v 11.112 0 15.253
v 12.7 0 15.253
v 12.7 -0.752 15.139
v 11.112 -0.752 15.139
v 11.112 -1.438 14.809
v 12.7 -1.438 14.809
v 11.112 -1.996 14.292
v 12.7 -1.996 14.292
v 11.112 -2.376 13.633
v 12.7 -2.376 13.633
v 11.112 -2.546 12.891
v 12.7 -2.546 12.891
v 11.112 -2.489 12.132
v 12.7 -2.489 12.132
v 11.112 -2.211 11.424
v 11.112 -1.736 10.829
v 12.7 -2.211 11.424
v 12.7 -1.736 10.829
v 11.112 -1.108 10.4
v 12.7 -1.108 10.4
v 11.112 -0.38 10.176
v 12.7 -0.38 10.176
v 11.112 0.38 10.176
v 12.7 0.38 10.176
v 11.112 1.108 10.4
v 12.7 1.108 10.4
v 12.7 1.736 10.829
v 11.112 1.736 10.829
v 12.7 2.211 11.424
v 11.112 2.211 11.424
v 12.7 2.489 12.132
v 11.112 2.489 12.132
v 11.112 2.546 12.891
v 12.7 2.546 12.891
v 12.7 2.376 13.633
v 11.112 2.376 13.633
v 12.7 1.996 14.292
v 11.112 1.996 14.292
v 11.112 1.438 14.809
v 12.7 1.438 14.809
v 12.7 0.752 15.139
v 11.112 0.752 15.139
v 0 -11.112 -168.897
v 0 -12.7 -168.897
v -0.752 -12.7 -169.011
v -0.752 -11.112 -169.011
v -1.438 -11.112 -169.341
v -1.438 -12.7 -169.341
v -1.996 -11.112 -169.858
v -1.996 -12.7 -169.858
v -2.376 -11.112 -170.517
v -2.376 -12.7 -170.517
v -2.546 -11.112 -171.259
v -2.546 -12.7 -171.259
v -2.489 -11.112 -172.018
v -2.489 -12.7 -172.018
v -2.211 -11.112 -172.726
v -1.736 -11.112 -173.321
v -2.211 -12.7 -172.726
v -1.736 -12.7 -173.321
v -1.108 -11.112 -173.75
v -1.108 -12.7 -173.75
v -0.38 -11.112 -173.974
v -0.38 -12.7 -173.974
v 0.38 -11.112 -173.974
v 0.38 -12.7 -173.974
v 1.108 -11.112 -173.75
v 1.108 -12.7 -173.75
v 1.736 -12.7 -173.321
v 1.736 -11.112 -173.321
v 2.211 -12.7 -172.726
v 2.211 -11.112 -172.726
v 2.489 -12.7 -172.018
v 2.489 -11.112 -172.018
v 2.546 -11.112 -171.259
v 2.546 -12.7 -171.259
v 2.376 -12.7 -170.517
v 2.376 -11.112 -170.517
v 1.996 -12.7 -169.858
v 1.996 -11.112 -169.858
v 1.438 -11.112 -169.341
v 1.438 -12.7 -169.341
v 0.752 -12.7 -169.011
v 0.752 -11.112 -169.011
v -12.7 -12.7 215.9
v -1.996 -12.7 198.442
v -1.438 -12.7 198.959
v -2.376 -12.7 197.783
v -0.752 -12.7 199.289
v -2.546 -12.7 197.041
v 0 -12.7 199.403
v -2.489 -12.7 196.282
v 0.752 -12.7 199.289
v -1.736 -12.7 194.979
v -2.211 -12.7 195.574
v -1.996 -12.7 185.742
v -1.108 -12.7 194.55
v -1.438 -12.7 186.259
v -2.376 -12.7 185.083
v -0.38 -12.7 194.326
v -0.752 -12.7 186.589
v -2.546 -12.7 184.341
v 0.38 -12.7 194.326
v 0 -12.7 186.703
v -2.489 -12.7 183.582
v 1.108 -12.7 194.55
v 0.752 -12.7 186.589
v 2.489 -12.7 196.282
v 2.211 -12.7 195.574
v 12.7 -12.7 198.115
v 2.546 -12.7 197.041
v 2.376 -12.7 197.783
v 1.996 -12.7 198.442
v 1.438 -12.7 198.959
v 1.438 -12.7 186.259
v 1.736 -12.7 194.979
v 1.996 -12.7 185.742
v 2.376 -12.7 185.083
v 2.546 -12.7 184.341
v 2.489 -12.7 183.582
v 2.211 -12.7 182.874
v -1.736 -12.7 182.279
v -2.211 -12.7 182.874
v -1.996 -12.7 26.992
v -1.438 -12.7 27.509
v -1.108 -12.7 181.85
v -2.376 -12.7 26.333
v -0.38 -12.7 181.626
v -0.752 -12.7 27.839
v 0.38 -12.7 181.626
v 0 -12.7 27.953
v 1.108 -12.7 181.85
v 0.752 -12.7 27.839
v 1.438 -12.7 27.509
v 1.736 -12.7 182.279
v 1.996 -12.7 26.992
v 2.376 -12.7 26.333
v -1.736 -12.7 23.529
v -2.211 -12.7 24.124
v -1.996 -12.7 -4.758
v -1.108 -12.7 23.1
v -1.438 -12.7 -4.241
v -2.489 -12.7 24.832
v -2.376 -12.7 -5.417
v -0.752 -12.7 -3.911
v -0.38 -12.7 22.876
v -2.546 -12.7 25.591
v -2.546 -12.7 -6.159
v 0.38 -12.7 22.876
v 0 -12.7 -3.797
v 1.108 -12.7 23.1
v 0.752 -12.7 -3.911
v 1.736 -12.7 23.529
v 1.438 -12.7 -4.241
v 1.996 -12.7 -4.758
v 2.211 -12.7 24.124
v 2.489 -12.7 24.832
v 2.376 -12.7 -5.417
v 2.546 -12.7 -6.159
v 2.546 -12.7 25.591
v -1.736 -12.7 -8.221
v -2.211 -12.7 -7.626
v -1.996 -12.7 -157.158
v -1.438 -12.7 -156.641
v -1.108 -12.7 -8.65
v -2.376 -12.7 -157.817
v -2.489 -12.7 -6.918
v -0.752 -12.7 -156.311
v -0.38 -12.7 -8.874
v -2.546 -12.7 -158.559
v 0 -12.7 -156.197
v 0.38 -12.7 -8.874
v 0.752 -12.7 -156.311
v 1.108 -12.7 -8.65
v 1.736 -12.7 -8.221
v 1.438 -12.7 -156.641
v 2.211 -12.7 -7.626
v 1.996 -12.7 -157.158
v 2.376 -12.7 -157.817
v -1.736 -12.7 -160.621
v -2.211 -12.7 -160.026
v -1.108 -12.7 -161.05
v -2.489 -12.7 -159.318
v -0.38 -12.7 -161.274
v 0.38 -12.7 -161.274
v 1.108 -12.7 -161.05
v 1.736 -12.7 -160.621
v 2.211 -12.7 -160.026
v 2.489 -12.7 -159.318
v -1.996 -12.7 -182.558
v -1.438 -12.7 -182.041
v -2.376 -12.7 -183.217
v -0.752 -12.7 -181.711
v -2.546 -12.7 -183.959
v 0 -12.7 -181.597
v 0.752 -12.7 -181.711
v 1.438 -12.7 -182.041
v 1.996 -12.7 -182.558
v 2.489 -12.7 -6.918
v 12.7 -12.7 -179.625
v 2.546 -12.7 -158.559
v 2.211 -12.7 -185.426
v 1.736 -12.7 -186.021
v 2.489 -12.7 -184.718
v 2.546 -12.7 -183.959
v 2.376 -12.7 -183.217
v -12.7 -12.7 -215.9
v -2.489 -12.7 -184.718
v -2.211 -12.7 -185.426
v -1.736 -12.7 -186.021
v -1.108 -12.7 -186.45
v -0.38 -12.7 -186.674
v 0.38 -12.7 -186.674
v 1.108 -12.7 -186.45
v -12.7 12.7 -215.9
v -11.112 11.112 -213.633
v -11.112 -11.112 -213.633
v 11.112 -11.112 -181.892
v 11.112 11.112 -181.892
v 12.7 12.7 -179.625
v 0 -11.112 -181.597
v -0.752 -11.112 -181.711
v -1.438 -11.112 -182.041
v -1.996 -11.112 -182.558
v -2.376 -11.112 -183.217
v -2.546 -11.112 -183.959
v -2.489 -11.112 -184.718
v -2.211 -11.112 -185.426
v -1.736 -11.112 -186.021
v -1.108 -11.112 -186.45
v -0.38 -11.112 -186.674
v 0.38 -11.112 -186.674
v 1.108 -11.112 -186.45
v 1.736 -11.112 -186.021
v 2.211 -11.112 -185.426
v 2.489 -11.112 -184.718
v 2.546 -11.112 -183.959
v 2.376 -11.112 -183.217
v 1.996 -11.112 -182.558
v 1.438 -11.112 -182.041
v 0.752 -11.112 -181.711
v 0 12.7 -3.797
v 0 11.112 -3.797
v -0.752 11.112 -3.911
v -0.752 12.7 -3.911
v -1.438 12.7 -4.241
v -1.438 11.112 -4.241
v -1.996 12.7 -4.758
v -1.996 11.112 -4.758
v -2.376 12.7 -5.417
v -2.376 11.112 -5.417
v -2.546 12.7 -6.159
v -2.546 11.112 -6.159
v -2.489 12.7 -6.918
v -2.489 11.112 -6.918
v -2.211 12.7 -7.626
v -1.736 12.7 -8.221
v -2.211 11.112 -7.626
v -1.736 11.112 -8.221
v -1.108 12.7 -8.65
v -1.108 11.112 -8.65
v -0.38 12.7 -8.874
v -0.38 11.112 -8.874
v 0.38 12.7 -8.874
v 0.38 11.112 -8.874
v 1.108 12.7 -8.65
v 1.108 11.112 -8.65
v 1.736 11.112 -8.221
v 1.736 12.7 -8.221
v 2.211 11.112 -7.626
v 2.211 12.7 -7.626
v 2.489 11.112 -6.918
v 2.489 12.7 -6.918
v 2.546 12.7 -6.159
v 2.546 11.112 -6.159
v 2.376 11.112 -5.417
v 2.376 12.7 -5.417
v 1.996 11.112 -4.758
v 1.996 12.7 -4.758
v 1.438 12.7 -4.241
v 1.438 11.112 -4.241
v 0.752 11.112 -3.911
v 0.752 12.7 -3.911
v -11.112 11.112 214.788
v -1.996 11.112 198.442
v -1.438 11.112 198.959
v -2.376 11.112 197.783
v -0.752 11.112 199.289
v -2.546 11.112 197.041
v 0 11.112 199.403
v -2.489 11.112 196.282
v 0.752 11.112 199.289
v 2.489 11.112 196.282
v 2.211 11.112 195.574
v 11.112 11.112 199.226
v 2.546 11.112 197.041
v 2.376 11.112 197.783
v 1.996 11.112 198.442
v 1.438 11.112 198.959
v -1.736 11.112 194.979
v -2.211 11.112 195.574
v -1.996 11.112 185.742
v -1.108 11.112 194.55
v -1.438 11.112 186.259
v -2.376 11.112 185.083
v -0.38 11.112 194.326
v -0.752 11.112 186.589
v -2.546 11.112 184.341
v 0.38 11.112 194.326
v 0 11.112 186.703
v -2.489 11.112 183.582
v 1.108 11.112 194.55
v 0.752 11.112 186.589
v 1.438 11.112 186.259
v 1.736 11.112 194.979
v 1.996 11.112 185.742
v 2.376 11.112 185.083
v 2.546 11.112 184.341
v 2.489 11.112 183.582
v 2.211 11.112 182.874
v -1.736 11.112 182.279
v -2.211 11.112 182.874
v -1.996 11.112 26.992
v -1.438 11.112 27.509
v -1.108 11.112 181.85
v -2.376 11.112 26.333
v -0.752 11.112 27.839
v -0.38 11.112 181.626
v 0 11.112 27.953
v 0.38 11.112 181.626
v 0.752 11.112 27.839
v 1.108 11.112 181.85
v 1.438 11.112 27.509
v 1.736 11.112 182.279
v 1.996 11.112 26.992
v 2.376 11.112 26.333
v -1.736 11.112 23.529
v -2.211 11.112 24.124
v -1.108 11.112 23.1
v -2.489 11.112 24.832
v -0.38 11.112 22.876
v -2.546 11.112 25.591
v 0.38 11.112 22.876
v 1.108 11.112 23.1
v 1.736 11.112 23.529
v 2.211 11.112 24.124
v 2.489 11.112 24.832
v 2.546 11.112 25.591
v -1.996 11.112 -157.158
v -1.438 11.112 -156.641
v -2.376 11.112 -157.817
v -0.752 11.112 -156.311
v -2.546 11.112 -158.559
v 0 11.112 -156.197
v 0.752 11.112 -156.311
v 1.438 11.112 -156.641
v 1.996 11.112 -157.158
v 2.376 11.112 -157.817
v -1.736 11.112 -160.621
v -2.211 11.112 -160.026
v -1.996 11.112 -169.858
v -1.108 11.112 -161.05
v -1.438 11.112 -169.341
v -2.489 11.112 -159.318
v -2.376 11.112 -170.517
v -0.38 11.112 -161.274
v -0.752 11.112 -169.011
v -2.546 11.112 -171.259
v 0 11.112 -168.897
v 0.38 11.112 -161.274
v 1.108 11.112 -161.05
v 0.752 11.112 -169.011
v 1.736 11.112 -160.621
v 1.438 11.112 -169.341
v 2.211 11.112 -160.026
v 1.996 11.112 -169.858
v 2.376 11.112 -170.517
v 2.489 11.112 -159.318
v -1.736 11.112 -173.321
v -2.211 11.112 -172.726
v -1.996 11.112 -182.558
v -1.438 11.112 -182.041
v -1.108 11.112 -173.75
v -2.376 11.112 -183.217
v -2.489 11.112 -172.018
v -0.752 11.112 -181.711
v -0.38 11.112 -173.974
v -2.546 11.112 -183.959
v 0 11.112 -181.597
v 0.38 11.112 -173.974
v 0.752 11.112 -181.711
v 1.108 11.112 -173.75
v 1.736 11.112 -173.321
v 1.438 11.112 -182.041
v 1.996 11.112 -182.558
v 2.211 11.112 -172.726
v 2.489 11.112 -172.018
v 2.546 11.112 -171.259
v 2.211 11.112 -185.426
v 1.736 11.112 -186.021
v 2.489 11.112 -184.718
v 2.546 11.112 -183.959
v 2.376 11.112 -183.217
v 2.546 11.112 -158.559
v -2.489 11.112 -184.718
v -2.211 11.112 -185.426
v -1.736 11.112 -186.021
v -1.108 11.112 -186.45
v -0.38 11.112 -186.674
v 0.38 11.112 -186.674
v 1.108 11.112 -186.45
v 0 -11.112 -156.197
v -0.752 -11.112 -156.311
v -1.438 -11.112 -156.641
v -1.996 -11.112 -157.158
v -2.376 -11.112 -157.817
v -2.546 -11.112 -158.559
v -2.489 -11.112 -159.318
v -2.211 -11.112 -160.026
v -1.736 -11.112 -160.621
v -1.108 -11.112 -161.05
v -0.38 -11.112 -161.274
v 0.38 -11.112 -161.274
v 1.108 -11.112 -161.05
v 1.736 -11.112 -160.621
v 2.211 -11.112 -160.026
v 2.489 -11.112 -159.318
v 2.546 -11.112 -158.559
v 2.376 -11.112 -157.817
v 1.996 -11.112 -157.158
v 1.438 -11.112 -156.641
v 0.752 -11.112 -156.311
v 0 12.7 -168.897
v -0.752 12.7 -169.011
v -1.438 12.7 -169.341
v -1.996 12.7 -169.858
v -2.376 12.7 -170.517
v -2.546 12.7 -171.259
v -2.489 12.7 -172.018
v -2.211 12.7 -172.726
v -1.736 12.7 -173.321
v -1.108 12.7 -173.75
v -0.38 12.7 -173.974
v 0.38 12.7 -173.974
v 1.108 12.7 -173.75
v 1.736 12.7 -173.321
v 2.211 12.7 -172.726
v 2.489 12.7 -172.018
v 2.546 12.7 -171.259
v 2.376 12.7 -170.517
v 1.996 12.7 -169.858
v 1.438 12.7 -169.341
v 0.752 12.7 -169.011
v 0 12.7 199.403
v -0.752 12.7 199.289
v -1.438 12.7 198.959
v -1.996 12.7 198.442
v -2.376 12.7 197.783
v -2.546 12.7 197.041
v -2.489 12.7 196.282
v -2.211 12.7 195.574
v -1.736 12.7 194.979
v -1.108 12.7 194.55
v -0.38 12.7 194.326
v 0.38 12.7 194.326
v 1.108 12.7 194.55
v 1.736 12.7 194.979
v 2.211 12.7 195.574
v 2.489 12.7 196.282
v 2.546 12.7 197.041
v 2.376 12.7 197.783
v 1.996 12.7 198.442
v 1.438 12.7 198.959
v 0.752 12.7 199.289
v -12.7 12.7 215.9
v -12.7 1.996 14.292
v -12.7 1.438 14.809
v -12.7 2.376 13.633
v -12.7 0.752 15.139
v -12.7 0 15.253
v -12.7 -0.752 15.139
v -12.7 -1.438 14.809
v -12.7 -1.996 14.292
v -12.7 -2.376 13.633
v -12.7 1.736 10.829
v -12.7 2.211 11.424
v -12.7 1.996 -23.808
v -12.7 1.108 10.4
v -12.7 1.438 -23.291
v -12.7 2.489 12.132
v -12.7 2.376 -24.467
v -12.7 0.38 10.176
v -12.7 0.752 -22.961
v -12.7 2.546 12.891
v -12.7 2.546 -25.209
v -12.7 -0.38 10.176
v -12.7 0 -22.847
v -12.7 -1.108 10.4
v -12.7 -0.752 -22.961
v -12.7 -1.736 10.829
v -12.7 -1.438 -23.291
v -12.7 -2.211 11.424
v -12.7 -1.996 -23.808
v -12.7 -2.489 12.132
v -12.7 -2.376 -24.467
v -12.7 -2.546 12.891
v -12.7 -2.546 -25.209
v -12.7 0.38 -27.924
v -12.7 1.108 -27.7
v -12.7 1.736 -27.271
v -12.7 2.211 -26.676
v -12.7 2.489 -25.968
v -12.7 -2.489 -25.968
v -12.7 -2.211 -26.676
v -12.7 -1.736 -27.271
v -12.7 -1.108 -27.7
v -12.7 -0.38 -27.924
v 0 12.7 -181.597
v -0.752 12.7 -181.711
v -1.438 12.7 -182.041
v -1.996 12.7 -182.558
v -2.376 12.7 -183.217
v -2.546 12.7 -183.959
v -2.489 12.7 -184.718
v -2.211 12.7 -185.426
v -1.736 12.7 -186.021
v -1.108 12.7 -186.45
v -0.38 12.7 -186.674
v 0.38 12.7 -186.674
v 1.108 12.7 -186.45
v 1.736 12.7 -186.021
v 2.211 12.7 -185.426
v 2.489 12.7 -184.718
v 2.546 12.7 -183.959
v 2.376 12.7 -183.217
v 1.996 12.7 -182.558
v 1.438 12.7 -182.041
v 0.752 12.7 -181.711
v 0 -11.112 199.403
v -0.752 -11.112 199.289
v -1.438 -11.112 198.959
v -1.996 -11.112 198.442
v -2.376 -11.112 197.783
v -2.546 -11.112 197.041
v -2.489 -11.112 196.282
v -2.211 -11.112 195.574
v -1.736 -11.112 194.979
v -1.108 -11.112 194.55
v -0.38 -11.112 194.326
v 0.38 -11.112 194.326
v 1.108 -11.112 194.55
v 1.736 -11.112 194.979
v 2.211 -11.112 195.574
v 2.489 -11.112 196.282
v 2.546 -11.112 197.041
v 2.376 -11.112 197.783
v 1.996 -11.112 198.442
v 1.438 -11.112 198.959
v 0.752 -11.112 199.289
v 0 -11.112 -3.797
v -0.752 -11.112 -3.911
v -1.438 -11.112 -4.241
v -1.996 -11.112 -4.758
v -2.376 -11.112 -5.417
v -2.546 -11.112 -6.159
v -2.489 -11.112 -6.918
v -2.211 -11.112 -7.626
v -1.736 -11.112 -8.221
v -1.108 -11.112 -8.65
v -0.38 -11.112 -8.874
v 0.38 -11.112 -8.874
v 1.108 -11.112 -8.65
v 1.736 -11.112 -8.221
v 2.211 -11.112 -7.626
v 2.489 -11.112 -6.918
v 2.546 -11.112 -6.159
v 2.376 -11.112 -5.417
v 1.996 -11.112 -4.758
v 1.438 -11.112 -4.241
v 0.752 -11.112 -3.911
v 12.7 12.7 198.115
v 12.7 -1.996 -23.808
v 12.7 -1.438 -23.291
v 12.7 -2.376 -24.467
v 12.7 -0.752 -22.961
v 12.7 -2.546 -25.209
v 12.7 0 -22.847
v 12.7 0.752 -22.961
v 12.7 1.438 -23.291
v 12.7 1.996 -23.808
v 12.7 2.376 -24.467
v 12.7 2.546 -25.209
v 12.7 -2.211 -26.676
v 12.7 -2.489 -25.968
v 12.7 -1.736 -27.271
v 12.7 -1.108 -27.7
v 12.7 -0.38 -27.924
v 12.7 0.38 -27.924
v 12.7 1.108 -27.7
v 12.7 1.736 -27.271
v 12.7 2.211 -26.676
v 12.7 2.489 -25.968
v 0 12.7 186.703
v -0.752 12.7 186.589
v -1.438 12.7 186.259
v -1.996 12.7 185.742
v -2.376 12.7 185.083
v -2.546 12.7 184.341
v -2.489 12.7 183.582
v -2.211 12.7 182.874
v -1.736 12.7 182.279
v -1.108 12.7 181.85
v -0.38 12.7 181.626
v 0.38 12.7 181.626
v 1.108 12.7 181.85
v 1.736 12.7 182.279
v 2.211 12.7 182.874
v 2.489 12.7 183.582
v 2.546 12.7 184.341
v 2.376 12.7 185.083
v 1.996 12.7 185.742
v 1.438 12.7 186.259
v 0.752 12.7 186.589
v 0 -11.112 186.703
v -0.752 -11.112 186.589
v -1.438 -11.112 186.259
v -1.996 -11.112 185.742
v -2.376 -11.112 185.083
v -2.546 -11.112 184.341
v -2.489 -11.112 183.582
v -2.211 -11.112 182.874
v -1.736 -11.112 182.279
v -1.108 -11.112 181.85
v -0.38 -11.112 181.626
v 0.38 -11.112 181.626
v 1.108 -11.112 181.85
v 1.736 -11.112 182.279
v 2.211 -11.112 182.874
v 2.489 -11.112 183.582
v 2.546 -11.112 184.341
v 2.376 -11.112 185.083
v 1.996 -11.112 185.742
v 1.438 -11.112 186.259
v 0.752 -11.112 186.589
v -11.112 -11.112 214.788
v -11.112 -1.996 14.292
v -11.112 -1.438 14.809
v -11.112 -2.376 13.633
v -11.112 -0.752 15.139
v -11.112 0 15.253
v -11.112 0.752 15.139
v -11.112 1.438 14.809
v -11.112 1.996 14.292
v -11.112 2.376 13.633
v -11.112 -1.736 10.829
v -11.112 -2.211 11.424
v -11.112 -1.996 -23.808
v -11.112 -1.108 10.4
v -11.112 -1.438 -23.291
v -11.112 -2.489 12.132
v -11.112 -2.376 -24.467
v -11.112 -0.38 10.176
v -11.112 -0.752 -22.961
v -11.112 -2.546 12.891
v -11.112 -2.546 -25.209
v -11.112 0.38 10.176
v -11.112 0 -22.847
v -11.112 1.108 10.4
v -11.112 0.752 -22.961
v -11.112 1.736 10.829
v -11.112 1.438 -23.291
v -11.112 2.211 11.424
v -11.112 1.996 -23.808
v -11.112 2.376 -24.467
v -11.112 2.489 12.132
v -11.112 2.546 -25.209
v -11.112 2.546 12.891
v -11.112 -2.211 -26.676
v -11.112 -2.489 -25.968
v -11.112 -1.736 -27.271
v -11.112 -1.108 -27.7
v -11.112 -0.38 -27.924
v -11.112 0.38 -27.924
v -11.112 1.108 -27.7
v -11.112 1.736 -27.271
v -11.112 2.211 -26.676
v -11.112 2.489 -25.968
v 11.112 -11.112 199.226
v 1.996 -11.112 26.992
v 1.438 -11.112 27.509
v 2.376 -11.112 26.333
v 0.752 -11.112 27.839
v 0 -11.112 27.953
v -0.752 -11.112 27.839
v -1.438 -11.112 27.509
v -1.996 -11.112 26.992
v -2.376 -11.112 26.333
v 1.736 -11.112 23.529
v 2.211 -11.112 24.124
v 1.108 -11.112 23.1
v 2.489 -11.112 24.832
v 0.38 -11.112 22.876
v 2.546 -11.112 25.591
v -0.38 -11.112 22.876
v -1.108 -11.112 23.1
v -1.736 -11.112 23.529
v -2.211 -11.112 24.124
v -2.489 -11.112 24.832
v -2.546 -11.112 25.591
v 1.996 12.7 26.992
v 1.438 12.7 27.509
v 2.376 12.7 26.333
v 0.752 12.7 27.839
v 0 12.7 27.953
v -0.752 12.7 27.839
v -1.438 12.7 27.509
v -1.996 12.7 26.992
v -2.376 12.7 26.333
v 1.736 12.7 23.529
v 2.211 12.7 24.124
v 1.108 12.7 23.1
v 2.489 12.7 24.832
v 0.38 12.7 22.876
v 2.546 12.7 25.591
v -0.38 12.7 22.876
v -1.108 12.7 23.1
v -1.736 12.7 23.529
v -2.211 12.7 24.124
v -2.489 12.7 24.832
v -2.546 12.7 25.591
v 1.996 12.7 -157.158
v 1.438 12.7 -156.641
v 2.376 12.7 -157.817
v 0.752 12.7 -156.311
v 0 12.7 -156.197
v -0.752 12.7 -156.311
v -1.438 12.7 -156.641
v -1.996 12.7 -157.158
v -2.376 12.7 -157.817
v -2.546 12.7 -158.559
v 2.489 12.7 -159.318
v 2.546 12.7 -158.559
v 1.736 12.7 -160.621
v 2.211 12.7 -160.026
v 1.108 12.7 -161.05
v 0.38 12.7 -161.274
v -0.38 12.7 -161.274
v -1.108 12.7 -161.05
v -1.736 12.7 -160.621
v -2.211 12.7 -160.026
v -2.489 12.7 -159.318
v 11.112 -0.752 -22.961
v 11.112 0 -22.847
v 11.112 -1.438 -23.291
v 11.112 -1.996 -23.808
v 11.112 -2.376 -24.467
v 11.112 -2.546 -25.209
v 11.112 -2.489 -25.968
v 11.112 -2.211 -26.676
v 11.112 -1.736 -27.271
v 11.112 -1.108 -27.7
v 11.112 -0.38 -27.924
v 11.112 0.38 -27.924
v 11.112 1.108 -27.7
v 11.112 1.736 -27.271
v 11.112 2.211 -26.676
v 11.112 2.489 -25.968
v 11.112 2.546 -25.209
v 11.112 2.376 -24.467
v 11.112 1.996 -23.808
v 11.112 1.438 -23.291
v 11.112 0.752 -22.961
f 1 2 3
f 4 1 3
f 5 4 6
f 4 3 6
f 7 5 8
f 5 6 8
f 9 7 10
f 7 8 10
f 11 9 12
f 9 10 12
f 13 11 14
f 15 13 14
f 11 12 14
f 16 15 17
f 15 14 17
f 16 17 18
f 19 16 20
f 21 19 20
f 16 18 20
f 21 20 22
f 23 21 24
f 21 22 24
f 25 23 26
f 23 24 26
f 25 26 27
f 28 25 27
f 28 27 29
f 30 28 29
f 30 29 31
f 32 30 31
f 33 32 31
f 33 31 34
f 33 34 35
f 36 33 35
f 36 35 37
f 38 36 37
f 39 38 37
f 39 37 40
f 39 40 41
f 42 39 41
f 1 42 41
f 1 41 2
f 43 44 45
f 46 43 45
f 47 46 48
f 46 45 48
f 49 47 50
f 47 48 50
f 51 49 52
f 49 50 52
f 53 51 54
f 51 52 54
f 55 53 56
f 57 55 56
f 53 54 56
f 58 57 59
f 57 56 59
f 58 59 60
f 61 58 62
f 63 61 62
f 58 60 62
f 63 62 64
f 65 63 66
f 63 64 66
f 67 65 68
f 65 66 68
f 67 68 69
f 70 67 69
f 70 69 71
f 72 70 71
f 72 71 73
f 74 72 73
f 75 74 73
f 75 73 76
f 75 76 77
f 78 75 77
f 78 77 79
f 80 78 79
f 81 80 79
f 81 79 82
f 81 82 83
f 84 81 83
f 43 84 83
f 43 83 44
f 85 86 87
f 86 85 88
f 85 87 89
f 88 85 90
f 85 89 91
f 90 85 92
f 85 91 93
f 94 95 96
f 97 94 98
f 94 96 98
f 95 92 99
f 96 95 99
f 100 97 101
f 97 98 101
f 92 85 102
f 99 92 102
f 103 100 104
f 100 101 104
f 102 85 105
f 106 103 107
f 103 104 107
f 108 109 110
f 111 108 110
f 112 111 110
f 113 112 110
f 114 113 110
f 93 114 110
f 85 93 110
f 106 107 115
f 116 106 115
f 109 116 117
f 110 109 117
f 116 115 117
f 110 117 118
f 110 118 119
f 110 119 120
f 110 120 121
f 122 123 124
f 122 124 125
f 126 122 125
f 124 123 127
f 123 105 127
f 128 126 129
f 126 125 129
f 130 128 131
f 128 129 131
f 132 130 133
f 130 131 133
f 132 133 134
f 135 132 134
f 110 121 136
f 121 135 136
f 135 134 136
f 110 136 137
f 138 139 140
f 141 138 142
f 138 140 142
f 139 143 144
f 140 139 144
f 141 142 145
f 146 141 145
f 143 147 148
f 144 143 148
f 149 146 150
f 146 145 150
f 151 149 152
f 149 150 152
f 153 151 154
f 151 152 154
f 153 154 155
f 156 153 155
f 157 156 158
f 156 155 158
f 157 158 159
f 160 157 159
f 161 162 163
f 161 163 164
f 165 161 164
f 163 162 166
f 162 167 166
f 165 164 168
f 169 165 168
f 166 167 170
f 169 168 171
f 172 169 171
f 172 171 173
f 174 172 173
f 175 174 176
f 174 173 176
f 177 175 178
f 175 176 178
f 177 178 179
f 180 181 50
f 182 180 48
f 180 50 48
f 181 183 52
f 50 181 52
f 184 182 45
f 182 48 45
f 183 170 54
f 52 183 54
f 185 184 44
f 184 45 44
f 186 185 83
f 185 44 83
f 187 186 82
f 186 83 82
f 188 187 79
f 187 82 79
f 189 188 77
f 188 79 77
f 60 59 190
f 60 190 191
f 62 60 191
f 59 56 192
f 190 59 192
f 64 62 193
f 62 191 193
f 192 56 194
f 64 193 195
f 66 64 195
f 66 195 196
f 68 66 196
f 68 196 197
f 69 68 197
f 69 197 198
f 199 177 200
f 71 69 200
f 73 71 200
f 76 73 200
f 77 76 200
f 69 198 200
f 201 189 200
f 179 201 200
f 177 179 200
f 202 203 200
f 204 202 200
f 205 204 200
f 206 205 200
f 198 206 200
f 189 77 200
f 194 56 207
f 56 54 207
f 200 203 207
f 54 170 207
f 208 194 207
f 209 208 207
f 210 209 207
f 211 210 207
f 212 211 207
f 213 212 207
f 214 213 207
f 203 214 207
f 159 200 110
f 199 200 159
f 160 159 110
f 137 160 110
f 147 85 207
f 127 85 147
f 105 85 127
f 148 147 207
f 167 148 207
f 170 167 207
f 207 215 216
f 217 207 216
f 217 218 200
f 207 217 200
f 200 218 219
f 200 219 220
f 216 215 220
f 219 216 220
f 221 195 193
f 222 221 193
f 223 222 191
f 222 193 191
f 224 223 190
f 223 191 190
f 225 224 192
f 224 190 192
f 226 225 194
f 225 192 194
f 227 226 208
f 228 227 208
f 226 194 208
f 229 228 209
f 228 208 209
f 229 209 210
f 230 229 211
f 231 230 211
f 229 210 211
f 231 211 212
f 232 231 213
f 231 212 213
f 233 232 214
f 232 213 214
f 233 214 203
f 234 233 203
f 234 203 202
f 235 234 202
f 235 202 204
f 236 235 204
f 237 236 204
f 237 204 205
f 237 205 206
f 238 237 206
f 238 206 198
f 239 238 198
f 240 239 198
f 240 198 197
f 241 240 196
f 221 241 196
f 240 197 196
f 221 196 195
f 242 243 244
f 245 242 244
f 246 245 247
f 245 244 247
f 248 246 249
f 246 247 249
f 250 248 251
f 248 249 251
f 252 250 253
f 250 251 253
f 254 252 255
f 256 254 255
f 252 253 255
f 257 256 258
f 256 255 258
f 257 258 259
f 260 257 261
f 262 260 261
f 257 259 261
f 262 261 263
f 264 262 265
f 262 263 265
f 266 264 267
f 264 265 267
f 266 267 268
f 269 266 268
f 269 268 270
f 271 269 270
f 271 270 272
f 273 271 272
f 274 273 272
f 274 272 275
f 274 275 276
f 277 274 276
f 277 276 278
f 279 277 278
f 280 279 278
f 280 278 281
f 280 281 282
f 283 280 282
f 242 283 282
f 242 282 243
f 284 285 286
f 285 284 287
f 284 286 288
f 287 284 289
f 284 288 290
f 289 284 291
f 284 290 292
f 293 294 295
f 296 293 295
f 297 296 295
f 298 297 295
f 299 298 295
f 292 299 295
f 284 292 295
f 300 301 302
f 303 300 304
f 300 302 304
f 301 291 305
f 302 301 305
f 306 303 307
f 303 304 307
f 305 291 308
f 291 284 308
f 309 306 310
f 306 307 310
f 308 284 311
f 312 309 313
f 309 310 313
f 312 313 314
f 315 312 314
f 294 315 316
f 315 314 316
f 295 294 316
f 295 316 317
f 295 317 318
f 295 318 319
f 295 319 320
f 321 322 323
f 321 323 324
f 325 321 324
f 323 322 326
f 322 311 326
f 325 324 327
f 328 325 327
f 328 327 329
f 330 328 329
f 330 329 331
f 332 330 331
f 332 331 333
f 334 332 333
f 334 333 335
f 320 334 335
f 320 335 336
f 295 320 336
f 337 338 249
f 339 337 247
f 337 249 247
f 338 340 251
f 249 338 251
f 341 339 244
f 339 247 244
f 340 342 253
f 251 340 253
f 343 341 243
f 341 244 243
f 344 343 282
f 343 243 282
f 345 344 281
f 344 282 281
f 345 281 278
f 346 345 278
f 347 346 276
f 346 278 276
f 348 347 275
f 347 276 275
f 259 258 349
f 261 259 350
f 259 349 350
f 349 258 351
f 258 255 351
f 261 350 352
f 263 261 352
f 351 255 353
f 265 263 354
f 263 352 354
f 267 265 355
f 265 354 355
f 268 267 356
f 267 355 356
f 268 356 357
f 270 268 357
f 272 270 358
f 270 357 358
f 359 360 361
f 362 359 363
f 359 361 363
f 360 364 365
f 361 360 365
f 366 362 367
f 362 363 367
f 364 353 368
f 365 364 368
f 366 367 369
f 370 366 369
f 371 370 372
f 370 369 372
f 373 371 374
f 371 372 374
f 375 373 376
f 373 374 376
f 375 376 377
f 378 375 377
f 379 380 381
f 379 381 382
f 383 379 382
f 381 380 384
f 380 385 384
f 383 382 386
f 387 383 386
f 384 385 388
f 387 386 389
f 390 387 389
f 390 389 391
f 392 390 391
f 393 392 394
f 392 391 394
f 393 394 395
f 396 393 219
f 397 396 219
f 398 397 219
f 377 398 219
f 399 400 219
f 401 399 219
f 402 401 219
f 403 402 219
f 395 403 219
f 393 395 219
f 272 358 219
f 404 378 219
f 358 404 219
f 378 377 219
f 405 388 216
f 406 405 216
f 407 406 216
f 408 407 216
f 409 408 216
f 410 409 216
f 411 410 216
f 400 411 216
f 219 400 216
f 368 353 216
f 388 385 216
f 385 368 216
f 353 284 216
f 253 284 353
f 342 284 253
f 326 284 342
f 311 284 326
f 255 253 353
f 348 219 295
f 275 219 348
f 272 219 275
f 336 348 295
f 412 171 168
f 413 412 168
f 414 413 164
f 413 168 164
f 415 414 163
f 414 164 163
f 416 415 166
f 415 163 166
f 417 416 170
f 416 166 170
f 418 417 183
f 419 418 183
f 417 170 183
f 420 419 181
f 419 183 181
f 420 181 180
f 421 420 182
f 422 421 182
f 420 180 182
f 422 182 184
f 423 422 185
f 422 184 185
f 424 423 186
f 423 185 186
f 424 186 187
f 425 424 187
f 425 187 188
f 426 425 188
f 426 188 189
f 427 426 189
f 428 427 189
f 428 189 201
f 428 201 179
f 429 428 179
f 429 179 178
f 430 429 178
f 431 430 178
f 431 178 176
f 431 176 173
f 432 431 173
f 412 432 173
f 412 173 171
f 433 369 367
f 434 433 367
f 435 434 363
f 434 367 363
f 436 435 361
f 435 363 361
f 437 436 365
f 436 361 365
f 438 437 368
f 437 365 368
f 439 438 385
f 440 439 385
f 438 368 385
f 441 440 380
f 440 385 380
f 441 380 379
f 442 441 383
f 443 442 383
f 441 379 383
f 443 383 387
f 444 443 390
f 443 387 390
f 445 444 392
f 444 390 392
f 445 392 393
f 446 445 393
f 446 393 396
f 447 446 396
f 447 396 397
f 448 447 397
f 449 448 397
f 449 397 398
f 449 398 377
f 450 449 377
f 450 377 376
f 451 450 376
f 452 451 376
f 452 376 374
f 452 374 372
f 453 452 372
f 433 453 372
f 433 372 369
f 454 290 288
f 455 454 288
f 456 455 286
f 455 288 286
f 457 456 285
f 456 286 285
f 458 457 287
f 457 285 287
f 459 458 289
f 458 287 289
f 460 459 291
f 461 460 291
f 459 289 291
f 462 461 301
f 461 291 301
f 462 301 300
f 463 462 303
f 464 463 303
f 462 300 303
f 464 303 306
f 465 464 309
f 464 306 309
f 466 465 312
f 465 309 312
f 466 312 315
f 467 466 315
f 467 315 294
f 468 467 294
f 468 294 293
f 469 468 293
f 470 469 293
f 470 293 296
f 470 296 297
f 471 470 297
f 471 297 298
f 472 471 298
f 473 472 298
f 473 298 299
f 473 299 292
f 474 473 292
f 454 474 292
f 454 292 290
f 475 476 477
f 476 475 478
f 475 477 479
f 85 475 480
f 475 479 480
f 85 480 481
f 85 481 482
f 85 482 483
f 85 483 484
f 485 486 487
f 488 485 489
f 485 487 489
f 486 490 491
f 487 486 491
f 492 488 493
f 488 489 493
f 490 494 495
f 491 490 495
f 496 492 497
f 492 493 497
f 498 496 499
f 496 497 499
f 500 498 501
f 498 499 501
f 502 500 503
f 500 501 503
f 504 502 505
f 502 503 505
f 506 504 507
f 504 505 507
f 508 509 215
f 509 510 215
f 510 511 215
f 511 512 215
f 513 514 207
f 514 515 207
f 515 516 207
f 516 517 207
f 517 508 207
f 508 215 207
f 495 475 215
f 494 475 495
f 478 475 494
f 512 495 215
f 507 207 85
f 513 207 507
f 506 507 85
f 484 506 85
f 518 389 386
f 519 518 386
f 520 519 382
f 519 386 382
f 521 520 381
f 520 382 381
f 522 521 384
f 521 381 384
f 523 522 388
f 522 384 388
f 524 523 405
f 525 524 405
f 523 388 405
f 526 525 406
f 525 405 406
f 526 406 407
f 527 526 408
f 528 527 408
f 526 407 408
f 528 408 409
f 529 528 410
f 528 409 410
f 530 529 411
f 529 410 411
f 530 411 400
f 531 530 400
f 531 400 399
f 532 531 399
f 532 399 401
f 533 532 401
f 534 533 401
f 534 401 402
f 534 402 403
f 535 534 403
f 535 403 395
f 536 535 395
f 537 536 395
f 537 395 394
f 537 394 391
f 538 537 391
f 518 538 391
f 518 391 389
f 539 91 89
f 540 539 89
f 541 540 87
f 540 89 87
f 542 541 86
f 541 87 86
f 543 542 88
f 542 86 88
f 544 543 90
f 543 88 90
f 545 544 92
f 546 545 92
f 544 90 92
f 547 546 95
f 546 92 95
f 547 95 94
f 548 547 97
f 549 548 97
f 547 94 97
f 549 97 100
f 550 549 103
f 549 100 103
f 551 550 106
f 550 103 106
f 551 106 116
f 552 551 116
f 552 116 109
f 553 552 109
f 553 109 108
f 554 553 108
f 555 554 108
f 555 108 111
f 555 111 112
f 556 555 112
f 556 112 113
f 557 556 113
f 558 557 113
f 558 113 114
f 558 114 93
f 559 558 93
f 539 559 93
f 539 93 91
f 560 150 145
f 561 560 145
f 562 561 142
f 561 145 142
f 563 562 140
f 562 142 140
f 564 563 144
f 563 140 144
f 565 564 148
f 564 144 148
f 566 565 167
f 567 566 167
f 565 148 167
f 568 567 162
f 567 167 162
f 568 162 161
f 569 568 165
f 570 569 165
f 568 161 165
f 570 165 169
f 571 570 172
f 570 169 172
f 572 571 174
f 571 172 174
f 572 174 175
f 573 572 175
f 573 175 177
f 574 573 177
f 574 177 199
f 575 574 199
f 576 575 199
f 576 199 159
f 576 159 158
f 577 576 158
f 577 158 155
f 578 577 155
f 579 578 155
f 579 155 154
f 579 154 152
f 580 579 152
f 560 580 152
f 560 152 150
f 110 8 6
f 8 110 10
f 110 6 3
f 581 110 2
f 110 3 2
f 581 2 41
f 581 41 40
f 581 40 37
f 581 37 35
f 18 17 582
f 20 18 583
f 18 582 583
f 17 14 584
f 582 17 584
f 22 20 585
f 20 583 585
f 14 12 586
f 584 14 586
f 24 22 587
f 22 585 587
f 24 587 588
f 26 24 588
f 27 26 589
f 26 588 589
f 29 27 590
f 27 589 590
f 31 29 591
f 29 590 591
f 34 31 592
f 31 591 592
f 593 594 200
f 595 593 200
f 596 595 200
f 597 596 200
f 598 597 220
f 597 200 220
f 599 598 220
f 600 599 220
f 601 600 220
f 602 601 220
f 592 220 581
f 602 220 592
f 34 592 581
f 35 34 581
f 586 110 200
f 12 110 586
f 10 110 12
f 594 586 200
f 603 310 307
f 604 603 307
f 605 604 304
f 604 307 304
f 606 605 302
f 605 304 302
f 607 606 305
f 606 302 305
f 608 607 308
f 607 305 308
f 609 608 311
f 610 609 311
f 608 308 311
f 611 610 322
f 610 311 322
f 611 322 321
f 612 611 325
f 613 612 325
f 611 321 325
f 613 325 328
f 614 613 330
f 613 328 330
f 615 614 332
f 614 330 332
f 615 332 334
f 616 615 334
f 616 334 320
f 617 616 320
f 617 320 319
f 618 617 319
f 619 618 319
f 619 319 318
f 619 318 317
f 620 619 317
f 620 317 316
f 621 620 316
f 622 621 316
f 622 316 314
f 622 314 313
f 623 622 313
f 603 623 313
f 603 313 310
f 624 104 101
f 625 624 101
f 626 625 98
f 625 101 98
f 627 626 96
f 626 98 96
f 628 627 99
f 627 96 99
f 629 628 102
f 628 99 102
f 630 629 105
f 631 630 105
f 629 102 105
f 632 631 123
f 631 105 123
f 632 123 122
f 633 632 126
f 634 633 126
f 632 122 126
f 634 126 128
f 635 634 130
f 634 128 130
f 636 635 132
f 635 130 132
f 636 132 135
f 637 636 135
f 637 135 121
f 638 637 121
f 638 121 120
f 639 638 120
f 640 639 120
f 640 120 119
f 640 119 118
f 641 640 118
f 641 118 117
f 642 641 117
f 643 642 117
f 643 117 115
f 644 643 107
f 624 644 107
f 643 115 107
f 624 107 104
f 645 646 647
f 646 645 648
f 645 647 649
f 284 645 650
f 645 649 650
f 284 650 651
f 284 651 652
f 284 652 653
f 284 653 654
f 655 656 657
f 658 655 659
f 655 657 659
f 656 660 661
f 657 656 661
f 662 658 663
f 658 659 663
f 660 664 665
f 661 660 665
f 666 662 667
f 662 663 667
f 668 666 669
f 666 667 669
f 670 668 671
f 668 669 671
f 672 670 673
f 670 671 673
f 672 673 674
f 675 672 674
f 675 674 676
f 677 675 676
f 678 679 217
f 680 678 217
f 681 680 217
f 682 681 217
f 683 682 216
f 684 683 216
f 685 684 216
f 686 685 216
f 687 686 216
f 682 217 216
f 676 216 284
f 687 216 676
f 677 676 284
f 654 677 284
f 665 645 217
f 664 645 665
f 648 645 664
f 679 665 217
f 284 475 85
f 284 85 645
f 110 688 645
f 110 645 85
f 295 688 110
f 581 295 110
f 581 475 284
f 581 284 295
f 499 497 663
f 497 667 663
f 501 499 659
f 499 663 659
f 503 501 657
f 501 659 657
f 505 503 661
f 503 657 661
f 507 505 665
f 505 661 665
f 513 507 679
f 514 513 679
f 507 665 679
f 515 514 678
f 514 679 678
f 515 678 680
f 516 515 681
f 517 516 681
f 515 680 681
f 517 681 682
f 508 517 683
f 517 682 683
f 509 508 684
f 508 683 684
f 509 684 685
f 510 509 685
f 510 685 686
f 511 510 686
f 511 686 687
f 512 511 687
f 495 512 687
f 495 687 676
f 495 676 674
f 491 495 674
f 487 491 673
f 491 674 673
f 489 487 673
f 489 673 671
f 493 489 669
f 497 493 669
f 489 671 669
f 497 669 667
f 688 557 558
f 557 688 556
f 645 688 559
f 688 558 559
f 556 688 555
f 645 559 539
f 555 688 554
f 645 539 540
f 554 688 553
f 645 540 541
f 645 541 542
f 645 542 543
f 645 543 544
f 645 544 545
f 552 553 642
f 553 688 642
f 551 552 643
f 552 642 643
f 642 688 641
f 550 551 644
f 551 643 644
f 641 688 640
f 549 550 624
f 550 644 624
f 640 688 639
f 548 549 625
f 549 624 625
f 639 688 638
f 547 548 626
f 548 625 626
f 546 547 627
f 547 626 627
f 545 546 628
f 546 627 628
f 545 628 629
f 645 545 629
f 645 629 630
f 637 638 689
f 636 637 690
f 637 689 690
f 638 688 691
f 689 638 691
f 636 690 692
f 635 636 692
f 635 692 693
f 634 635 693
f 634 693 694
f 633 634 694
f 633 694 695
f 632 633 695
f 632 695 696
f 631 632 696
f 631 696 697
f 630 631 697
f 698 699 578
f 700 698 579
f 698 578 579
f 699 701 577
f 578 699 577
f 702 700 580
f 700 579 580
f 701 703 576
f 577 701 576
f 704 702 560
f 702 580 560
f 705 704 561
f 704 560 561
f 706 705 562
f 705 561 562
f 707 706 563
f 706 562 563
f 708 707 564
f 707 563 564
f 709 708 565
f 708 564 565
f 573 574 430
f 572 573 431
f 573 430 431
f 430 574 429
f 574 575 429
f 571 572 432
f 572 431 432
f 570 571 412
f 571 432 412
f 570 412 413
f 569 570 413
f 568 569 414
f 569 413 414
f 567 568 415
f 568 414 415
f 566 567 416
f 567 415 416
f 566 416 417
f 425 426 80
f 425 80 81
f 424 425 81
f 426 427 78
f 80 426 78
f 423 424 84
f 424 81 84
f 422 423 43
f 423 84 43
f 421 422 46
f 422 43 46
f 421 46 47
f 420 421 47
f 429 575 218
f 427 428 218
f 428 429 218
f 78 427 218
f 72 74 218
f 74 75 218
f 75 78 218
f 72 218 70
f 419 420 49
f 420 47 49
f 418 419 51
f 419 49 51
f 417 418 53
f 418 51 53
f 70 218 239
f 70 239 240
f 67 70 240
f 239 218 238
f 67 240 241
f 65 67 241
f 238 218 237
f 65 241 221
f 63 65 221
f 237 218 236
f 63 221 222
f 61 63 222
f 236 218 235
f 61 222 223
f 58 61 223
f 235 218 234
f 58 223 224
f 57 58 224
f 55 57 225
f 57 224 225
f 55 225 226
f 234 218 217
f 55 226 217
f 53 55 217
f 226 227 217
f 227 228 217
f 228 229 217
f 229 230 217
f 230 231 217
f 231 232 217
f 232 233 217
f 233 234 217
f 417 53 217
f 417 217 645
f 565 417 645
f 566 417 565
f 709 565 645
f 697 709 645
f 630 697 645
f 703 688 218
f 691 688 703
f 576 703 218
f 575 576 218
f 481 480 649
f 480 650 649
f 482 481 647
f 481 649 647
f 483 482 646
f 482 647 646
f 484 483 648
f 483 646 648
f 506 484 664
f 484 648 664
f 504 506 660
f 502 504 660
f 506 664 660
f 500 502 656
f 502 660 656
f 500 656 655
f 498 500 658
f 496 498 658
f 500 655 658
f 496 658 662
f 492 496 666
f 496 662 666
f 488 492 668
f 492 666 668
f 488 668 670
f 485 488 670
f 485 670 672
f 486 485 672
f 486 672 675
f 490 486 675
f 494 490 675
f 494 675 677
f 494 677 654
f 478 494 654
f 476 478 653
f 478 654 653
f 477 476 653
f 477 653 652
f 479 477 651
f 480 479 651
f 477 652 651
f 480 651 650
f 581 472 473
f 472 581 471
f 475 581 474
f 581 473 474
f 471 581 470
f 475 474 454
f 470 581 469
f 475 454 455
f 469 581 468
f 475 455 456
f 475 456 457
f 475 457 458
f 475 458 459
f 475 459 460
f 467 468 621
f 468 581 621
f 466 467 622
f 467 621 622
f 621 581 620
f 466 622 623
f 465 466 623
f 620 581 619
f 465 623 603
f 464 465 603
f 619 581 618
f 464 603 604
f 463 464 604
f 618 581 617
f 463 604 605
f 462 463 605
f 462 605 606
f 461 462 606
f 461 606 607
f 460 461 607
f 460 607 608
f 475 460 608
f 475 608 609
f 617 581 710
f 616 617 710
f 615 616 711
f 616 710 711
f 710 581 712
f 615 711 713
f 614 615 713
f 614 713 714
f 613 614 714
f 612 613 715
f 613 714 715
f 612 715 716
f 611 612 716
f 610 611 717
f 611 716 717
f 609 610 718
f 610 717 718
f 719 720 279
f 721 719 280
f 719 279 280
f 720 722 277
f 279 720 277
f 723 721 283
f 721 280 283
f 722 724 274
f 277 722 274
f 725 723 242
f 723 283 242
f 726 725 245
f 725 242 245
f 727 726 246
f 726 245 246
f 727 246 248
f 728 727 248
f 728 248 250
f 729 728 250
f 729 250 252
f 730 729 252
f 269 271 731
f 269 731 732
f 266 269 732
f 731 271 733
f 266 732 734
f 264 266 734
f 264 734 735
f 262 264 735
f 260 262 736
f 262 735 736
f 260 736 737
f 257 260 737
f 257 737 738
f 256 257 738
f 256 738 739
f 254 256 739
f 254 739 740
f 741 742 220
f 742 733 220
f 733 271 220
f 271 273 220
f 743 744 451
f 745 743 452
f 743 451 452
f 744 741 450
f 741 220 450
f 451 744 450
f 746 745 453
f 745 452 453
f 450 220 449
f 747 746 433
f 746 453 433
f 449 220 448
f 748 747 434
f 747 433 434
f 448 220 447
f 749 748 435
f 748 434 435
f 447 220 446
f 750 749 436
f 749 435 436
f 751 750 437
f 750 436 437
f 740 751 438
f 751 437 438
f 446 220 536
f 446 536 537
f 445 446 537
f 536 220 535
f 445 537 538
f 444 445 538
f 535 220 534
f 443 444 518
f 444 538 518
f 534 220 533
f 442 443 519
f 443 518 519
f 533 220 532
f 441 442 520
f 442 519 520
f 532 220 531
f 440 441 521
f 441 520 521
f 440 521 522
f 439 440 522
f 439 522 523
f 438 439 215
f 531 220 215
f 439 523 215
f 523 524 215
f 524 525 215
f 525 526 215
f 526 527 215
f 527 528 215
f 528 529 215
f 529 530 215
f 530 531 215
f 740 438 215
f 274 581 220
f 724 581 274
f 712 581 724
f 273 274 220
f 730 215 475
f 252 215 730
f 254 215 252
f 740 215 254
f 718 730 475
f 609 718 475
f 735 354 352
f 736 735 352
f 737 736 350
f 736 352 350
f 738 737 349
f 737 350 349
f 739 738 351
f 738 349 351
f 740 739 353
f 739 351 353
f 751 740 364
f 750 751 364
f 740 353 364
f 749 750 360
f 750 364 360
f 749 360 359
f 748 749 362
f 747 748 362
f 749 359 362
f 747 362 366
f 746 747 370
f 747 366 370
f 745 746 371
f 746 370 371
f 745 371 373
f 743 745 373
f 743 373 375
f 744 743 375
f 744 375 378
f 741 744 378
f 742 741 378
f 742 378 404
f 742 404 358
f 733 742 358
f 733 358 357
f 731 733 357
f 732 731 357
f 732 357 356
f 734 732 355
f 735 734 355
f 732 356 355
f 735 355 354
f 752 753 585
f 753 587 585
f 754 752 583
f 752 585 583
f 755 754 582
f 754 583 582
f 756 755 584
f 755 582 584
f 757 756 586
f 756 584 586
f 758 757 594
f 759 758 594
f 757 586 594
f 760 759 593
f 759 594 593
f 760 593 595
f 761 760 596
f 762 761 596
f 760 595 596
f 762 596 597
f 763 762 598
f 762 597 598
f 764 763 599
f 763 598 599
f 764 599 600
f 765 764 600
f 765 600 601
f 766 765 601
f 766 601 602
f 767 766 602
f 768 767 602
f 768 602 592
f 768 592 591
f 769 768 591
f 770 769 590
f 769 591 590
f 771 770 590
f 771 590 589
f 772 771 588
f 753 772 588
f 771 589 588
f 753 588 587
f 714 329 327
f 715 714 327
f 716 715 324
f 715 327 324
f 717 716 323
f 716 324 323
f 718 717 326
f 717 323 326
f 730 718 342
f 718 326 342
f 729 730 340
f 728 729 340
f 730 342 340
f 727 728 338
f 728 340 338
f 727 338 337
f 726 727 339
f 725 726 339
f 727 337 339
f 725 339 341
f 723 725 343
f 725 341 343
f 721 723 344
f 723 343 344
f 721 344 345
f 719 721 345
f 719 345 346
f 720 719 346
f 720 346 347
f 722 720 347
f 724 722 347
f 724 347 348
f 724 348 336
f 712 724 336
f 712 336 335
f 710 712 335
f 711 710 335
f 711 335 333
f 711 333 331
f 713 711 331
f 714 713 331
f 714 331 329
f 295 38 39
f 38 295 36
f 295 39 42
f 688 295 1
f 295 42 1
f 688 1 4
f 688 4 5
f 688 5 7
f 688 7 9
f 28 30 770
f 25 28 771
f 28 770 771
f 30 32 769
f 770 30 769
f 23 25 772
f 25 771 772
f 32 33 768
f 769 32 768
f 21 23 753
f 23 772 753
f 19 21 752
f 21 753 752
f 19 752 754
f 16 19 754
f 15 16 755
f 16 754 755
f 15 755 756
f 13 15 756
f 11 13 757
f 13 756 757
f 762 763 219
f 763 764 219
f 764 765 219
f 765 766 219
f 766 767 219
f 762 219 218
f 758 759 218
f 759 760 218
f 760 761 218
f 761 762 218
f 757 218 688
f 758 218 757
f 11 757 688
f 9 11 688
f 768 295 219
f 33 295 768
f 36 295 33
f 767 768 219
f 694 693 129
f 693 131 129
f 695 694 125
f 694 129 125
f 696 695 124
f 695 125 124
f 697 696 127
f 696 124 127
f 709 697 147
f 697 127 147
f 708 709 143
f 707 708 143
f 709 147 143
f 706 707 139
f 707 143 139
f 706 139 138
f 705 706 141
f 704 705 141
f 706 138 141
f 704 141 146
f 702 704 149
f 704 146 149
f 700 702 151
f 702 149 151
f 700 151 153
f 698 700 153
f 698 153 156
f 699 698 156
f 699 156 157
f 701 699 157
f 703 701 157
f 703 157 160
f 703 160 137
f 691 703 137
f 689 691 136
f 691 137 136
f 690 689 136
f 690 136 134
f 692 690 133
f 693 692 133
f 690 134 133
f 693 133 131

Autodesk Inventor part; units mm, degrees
ref_plane "YZ Plane" through (0, 0, 0) normal (1, 0, 0) x (0, 1, 0)
ref_plane "XZ Plane" through (0, 0, 0) normal (0, 1, 0) x (-1, 0, 0)
ref_plane "XY Plane" through (0, 0, 0) normal (0, 0, 1) x (1, 0, 0)
sketch "Sketch1" plane through (0, 0, 0) normal (0, 0, 1) x (1, 0, 0)
  line L0 (-12.7, -12.7) -> (12.7, -12.7)
  line L1 (12.7, -12.7) -> (12.7, 12.7)
  line L2 (12.7, 12.7) -> (-12.7, 12.7)
  line L3 (-12.7, 12.7) -> (-12.7, -12.7)
  line L4 (-12.7, -12.7) -> (12.7, 12.7) construction
  line L5 (12.7, -12.7) -> (-12.7, 12.7) construction
  line L6 (-11.1125, 11.1125) -> (11.1125, 11.1125)
  line L7 (11.1125, 11.1125) -> (11.1125, -11.1125)
  line L8 (11.1125, -11.1125) -> (-11.1125, -11.1125)
  line L9 (-11.1125, -11.1125) -> (-11.1125, 11.1125)
  point P0 (0, 0)
  dimension "width" = 25.4
  dimension "height" = 25.4
  dimension "thickness" = 1.5875
extrude "Extrusion1" add sketch "Sketch1" along normal mid plane 431.8
sketch "Sketch3" plane through (-12.7, 12.7, 215.9) normal (0, 1, 0) x (1, 0, 0)
  line L0 (0, 431.8) -> (0, 0) construction
  line L1 (25.4, 0) -> (0, 0) construction
  line L2 (25.4, 431.8) -> (25.4, 0) construction
  line L3 (0, 431.8) -> (25.4, 431.8) construction
  line L4 (0, 0) -> (0, 431.8) construction
  line L5 (0, 0) -> (25.4, 17.7853)
  line L6 (25.4, 431.8) -> (25.4, 0) construction
  line L7 (0, 0) -> (25.4, 0) construction
  line L8 (0, 0) -> (25.4, 0)
  line L9 (25.4, 0) -> (25.4, 17.7853)
  line L10 (0, 431.8) -> (25.4, 395.525)
  line L11 (25.4, 431.8) -> (0, 431.8) construction
  line L12 (0, 431.8) -> (25.4, 431.8)
  line L13 (25.4, 431.8) -> (25.4, 395.525)
  point P0 (12.7, 215.9)
  dimension "d12" = 55
extrude "Extrusion3" cut sketch "Sketch3" against normal through all
sketch "Sketch4" plane through (-12.7, 12.7, 215.9) normal (0, 1, 0) x (1, 0, 0)
  line L0 (25.4, 17.7853) -> (0, 0) construction
  line L1 (0, 0) -> (0, 431.8) construction
  line L2 (0, 431.8) -> (25.4, 395.525) construction
  line L3 (25.4, 395.525) -> (25.4, 17.7853) construction
  point P0 (12.7, 215.9)
  point P1 (12.7, 19.05)
  point P2 (12.7, 31.75)
  point P3 (12.7, 44.45)
  point P4 (12.7, 57.15)
  point P5 (12.7, 400.05)
  point P6 (12.7, 387.35)
  point P7 (12.7, 374.65)
  dimension "d13" = 19.05
  dimension "d16" = 12.7
  dimension "d28" = 31.75
  dimension "d31" = 12.7
hole "Hole1" at (0, 12.7, 196.85) at (0, 12.7, 184.15) at (0, 12.7, -158.75) at (0, 12.7, -171.45) at (0, 12.7, -184.15) direction (0, -1, 0) diameter 5.1054 end through all clearance for "Flat Head Machine Screw (82)" size "#10" standard "Ansi Unified Screw Threads"
sketch "Sketch5" plane through (-12.7, -12.7, 215.9) normal (-1, 0, 0) x (0, 0, 1)
  line L0 (-431.8, 0) -> (-431.8, 25.4) construction
  point P0 (-215.9, 12.7)
  point P1 (-241.3, 12.7)
  point P2 (-203.2, 12.7)
  point P3 (-431.8, 12.7)
  dimension "d36" = 38.1
  dimension "d37" = 190.5
hole "Hole2" at (-12.7, 0, -25.4) at (-12.7, 0, 12.7) direction (1, 0, 0) diameter 5.1054 end through all clearance for "Flat Head Machine Screw (82)" size "#10" standard "Ansi Unified Screw Threads"
sketch "Sketch6" plane through (-12.7, 12.7, 215.9) normal (0, 1, 0) x (1, 0, 0)
  line L0 (25.4, 395.525) -> (25.4, 17.7853) construction
  circle A0 centre (12.7, 374.65) radius 2.5527 construction
  point P0 (12.7, 215.9)
  point P1 (12.7, 222.25)
  point P2 (12.7, 190.5)
  dimension "d45" = 31.75
  dimension "d46" = 12.7
  dimension "d47" = 152.4
hole "Hole3" at (0, 12.7, -6.35) at (0, 12.7, 25.4) direction (0, -1, 0) diameter 5.1054 end through all clearance for "Socket Head Cap Screw" size "#10" standard "Ansi Unified Screw Threads"
properties part number "CL-002" material "Aluminum 6061"
